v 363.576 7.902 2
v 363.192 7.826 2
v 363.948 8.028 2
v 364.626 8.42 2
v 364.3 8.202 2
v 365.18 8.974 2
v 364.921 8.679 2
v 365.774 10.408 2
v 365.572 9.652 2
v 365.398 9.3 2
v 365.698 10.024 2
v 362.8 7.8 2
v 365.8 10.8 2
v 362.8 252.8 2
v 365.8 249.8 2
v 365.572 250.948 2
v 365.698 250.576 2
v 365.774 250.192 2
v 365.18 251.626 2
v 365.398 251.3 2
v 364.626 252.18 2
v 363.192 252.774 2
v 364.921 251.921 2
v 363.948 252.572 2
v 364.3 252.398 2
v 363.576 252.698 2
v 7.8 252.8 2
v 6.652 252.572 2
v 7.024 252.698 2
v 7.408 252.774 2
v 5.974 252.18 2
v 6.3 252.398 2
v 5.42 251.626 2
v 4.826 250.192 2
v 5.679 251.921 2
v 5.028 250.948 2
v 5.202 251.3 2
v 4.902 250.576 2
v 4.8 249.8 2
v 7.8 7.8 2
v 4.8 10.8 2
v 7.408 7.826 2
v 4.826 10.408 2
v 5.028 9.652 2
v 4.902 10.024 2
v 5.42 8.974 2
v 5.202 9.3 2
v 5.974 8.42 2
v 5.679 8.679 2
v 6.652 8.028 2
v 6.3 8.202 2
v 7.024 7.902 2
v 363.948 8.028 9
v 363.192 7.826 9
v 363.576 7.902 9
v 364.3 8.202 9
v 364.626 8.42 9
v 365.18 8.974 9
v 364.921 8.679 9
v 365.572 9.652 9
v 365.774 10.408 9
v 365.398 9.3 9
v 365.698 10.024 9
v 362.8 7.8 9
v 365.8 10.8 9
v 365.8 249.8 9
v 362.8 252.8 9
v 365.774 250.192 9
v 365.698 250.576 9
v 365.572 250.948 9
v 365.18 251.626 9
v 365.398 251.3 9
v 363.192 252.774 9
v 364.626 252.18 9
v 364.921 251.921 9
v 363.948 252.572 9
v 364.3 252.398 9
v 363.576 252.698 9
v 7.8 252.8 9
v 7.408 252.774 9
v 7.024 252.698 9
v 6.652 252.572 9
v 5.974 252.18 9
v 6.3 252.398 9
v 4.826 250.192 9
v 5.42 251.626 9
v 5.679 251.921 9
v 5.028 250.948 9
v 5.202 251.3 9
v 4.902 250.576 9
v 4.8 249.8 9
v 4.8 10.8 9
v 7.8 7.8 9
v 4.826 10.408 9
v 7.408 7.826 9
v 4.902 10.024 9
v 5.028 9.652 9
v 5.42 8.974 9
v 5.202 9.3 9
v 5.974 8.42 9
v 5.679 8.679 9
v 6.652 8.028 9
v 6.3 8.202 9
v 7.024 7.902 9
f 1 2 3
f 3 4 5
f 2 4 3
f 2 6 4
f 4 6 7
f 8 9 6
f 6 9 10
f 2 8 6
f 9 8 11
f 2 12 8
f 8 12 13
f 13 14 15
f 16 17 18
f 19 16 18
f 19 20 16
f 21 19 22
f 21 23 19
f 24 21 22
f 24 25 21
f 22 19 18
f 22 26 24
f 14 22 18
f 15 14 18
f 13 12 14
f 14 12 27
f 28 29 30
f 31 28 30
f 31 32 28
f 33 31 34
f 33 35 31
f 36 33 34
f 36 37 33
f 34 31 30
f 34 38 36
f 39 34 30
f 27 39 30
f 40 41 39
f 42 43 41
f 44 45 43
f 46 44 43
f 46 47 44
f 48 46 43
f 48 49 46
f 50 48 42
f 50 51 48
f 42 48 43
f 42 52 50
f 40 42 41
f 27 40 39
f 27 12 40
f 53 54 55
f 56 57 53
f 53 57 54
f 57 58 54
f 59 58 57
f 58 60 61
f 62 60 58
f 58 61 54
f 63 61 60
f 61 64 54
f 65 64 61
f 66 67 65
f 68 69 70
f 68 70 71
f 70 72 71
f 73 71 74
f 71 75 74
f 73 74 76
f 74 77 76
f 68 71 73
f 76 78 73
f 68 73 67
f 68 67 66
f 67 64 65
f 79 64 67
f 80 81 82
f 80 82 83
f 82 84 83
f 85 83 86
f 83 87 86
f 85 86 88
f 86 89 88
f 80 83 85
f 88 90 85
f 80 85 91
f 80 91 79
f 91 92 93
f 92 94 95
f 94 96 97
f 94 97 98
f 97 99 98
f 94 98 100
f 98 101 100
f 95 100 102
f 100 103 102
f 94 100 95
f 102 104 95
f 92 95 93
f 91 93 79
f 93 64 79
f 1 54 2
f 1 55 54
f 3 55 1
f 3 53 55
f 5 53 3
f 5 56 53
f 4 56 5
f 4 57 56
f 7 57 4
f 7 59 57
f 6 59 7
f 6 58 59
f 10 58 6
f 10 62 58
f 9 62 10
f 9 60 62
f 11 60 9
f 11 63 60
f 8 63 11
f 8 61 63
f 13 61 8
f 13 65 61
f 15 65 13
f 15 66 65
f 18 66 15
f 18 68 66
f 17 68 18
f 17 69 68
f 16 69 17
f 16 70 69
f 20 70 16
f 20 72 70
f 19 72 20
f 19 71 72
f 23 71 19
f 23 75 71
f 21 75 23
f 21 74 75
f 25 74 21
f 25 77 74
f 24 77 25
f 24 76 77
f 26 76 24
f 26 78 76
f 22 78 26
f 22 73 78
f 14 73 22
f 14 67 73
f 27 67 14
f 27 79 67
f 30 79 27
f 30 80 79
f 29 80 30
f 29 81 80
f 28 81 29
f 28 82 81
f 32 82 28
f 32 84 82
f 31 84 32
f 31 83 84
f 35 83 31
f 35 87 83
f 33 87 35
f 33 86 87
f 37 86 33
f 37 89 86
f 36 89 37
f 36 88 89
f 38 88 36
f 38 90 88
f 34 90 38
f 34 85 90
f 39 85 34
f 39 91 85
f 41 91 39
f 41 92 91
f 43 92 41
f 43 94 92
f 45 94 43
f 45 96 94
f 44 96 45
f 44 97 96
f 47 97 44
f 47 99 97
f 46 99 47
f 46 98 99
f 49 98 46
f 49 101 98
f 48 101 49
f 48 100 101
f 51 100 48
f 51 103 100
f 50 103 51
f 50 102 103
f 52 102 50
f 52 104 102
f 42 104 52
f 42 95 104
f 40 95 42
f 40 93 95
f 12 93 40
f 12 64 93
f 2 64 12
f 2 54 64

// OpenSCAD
// Stand-in parts for the photo render: lid, screen, board, blowers, fin stacks, heatpipe, chips, fans. Simplified shapes at the modelled positions.
include <../x1case.scad>
part = "none_x";
which = "lid";
if (which == "lid") translate([0, 0, lip_t]) linear_extrude(lid_t) lid2d();
if (which == "screen") translate([lx0 + bezel[0], ly0 + bezel[3], lip_t - 0.05]) cube([lid_w - bezel[0] - bezel[1], lid_h - bezel[2] - bezel[3], 0.1]);
if (which == "board") translate([board_pos[0], board_pos[1], z_board]) cube([board_w, board_h, board_t]);
if (which == "blowers") for (b = blowers_g) translate([b[0], b[1], z_board_back]) difference() { cylinder(d = 62, h = heatsink_h, $fn = 96); translate([0, 0, 1]) cylinder(d = b[2], h = heatsink_h, $fn = 96); }
if (which == "fins") for (f = fins_g) translate([f[0], board_pos[1], z_board_back]) cube([f[1], 12, heatsink_h]);
if (which == "pipe") translate([board_pos[0] + 75, board_pos[1] + 42, z_board_back]) cube([200, 14, 5]);
if (which == "chips") for (p = [[120, 20, 60, 30, 3], [200, 25, 40, 40, 2], [150, 100, 30, 25, 2], [20, 20, 28, 40, 4]]) translate([board_pos[0] + board_w - p[0] - p[2], board_pos[1] + board_h - p[1] - p[3], z_board_back]) cube([p[2], p[3], p[4]]);
if (which == "fans") for (c = fan_cs) translate([c[0], c[1], z_in - fan_t]) {
  difference() { translate([-60, -60, 0]) cube([120, 120, fan_t]); translate([0, 0, -1]) cylinder(d = 116, h = fan_t + 2, $fn = 96); }
  cylinder(d = 40, h = fan_t, $fn = 64);
}
if (which == "blades") for (c = fan_cs) translate([c[0], c[1], z_in - fan_t + 5]) for (a = [0 : 51.4 : 359]) rotate(a) translate([20, -2, 0]) rotate([20, 0, 0]) cube([36, 18, 1.5]);
